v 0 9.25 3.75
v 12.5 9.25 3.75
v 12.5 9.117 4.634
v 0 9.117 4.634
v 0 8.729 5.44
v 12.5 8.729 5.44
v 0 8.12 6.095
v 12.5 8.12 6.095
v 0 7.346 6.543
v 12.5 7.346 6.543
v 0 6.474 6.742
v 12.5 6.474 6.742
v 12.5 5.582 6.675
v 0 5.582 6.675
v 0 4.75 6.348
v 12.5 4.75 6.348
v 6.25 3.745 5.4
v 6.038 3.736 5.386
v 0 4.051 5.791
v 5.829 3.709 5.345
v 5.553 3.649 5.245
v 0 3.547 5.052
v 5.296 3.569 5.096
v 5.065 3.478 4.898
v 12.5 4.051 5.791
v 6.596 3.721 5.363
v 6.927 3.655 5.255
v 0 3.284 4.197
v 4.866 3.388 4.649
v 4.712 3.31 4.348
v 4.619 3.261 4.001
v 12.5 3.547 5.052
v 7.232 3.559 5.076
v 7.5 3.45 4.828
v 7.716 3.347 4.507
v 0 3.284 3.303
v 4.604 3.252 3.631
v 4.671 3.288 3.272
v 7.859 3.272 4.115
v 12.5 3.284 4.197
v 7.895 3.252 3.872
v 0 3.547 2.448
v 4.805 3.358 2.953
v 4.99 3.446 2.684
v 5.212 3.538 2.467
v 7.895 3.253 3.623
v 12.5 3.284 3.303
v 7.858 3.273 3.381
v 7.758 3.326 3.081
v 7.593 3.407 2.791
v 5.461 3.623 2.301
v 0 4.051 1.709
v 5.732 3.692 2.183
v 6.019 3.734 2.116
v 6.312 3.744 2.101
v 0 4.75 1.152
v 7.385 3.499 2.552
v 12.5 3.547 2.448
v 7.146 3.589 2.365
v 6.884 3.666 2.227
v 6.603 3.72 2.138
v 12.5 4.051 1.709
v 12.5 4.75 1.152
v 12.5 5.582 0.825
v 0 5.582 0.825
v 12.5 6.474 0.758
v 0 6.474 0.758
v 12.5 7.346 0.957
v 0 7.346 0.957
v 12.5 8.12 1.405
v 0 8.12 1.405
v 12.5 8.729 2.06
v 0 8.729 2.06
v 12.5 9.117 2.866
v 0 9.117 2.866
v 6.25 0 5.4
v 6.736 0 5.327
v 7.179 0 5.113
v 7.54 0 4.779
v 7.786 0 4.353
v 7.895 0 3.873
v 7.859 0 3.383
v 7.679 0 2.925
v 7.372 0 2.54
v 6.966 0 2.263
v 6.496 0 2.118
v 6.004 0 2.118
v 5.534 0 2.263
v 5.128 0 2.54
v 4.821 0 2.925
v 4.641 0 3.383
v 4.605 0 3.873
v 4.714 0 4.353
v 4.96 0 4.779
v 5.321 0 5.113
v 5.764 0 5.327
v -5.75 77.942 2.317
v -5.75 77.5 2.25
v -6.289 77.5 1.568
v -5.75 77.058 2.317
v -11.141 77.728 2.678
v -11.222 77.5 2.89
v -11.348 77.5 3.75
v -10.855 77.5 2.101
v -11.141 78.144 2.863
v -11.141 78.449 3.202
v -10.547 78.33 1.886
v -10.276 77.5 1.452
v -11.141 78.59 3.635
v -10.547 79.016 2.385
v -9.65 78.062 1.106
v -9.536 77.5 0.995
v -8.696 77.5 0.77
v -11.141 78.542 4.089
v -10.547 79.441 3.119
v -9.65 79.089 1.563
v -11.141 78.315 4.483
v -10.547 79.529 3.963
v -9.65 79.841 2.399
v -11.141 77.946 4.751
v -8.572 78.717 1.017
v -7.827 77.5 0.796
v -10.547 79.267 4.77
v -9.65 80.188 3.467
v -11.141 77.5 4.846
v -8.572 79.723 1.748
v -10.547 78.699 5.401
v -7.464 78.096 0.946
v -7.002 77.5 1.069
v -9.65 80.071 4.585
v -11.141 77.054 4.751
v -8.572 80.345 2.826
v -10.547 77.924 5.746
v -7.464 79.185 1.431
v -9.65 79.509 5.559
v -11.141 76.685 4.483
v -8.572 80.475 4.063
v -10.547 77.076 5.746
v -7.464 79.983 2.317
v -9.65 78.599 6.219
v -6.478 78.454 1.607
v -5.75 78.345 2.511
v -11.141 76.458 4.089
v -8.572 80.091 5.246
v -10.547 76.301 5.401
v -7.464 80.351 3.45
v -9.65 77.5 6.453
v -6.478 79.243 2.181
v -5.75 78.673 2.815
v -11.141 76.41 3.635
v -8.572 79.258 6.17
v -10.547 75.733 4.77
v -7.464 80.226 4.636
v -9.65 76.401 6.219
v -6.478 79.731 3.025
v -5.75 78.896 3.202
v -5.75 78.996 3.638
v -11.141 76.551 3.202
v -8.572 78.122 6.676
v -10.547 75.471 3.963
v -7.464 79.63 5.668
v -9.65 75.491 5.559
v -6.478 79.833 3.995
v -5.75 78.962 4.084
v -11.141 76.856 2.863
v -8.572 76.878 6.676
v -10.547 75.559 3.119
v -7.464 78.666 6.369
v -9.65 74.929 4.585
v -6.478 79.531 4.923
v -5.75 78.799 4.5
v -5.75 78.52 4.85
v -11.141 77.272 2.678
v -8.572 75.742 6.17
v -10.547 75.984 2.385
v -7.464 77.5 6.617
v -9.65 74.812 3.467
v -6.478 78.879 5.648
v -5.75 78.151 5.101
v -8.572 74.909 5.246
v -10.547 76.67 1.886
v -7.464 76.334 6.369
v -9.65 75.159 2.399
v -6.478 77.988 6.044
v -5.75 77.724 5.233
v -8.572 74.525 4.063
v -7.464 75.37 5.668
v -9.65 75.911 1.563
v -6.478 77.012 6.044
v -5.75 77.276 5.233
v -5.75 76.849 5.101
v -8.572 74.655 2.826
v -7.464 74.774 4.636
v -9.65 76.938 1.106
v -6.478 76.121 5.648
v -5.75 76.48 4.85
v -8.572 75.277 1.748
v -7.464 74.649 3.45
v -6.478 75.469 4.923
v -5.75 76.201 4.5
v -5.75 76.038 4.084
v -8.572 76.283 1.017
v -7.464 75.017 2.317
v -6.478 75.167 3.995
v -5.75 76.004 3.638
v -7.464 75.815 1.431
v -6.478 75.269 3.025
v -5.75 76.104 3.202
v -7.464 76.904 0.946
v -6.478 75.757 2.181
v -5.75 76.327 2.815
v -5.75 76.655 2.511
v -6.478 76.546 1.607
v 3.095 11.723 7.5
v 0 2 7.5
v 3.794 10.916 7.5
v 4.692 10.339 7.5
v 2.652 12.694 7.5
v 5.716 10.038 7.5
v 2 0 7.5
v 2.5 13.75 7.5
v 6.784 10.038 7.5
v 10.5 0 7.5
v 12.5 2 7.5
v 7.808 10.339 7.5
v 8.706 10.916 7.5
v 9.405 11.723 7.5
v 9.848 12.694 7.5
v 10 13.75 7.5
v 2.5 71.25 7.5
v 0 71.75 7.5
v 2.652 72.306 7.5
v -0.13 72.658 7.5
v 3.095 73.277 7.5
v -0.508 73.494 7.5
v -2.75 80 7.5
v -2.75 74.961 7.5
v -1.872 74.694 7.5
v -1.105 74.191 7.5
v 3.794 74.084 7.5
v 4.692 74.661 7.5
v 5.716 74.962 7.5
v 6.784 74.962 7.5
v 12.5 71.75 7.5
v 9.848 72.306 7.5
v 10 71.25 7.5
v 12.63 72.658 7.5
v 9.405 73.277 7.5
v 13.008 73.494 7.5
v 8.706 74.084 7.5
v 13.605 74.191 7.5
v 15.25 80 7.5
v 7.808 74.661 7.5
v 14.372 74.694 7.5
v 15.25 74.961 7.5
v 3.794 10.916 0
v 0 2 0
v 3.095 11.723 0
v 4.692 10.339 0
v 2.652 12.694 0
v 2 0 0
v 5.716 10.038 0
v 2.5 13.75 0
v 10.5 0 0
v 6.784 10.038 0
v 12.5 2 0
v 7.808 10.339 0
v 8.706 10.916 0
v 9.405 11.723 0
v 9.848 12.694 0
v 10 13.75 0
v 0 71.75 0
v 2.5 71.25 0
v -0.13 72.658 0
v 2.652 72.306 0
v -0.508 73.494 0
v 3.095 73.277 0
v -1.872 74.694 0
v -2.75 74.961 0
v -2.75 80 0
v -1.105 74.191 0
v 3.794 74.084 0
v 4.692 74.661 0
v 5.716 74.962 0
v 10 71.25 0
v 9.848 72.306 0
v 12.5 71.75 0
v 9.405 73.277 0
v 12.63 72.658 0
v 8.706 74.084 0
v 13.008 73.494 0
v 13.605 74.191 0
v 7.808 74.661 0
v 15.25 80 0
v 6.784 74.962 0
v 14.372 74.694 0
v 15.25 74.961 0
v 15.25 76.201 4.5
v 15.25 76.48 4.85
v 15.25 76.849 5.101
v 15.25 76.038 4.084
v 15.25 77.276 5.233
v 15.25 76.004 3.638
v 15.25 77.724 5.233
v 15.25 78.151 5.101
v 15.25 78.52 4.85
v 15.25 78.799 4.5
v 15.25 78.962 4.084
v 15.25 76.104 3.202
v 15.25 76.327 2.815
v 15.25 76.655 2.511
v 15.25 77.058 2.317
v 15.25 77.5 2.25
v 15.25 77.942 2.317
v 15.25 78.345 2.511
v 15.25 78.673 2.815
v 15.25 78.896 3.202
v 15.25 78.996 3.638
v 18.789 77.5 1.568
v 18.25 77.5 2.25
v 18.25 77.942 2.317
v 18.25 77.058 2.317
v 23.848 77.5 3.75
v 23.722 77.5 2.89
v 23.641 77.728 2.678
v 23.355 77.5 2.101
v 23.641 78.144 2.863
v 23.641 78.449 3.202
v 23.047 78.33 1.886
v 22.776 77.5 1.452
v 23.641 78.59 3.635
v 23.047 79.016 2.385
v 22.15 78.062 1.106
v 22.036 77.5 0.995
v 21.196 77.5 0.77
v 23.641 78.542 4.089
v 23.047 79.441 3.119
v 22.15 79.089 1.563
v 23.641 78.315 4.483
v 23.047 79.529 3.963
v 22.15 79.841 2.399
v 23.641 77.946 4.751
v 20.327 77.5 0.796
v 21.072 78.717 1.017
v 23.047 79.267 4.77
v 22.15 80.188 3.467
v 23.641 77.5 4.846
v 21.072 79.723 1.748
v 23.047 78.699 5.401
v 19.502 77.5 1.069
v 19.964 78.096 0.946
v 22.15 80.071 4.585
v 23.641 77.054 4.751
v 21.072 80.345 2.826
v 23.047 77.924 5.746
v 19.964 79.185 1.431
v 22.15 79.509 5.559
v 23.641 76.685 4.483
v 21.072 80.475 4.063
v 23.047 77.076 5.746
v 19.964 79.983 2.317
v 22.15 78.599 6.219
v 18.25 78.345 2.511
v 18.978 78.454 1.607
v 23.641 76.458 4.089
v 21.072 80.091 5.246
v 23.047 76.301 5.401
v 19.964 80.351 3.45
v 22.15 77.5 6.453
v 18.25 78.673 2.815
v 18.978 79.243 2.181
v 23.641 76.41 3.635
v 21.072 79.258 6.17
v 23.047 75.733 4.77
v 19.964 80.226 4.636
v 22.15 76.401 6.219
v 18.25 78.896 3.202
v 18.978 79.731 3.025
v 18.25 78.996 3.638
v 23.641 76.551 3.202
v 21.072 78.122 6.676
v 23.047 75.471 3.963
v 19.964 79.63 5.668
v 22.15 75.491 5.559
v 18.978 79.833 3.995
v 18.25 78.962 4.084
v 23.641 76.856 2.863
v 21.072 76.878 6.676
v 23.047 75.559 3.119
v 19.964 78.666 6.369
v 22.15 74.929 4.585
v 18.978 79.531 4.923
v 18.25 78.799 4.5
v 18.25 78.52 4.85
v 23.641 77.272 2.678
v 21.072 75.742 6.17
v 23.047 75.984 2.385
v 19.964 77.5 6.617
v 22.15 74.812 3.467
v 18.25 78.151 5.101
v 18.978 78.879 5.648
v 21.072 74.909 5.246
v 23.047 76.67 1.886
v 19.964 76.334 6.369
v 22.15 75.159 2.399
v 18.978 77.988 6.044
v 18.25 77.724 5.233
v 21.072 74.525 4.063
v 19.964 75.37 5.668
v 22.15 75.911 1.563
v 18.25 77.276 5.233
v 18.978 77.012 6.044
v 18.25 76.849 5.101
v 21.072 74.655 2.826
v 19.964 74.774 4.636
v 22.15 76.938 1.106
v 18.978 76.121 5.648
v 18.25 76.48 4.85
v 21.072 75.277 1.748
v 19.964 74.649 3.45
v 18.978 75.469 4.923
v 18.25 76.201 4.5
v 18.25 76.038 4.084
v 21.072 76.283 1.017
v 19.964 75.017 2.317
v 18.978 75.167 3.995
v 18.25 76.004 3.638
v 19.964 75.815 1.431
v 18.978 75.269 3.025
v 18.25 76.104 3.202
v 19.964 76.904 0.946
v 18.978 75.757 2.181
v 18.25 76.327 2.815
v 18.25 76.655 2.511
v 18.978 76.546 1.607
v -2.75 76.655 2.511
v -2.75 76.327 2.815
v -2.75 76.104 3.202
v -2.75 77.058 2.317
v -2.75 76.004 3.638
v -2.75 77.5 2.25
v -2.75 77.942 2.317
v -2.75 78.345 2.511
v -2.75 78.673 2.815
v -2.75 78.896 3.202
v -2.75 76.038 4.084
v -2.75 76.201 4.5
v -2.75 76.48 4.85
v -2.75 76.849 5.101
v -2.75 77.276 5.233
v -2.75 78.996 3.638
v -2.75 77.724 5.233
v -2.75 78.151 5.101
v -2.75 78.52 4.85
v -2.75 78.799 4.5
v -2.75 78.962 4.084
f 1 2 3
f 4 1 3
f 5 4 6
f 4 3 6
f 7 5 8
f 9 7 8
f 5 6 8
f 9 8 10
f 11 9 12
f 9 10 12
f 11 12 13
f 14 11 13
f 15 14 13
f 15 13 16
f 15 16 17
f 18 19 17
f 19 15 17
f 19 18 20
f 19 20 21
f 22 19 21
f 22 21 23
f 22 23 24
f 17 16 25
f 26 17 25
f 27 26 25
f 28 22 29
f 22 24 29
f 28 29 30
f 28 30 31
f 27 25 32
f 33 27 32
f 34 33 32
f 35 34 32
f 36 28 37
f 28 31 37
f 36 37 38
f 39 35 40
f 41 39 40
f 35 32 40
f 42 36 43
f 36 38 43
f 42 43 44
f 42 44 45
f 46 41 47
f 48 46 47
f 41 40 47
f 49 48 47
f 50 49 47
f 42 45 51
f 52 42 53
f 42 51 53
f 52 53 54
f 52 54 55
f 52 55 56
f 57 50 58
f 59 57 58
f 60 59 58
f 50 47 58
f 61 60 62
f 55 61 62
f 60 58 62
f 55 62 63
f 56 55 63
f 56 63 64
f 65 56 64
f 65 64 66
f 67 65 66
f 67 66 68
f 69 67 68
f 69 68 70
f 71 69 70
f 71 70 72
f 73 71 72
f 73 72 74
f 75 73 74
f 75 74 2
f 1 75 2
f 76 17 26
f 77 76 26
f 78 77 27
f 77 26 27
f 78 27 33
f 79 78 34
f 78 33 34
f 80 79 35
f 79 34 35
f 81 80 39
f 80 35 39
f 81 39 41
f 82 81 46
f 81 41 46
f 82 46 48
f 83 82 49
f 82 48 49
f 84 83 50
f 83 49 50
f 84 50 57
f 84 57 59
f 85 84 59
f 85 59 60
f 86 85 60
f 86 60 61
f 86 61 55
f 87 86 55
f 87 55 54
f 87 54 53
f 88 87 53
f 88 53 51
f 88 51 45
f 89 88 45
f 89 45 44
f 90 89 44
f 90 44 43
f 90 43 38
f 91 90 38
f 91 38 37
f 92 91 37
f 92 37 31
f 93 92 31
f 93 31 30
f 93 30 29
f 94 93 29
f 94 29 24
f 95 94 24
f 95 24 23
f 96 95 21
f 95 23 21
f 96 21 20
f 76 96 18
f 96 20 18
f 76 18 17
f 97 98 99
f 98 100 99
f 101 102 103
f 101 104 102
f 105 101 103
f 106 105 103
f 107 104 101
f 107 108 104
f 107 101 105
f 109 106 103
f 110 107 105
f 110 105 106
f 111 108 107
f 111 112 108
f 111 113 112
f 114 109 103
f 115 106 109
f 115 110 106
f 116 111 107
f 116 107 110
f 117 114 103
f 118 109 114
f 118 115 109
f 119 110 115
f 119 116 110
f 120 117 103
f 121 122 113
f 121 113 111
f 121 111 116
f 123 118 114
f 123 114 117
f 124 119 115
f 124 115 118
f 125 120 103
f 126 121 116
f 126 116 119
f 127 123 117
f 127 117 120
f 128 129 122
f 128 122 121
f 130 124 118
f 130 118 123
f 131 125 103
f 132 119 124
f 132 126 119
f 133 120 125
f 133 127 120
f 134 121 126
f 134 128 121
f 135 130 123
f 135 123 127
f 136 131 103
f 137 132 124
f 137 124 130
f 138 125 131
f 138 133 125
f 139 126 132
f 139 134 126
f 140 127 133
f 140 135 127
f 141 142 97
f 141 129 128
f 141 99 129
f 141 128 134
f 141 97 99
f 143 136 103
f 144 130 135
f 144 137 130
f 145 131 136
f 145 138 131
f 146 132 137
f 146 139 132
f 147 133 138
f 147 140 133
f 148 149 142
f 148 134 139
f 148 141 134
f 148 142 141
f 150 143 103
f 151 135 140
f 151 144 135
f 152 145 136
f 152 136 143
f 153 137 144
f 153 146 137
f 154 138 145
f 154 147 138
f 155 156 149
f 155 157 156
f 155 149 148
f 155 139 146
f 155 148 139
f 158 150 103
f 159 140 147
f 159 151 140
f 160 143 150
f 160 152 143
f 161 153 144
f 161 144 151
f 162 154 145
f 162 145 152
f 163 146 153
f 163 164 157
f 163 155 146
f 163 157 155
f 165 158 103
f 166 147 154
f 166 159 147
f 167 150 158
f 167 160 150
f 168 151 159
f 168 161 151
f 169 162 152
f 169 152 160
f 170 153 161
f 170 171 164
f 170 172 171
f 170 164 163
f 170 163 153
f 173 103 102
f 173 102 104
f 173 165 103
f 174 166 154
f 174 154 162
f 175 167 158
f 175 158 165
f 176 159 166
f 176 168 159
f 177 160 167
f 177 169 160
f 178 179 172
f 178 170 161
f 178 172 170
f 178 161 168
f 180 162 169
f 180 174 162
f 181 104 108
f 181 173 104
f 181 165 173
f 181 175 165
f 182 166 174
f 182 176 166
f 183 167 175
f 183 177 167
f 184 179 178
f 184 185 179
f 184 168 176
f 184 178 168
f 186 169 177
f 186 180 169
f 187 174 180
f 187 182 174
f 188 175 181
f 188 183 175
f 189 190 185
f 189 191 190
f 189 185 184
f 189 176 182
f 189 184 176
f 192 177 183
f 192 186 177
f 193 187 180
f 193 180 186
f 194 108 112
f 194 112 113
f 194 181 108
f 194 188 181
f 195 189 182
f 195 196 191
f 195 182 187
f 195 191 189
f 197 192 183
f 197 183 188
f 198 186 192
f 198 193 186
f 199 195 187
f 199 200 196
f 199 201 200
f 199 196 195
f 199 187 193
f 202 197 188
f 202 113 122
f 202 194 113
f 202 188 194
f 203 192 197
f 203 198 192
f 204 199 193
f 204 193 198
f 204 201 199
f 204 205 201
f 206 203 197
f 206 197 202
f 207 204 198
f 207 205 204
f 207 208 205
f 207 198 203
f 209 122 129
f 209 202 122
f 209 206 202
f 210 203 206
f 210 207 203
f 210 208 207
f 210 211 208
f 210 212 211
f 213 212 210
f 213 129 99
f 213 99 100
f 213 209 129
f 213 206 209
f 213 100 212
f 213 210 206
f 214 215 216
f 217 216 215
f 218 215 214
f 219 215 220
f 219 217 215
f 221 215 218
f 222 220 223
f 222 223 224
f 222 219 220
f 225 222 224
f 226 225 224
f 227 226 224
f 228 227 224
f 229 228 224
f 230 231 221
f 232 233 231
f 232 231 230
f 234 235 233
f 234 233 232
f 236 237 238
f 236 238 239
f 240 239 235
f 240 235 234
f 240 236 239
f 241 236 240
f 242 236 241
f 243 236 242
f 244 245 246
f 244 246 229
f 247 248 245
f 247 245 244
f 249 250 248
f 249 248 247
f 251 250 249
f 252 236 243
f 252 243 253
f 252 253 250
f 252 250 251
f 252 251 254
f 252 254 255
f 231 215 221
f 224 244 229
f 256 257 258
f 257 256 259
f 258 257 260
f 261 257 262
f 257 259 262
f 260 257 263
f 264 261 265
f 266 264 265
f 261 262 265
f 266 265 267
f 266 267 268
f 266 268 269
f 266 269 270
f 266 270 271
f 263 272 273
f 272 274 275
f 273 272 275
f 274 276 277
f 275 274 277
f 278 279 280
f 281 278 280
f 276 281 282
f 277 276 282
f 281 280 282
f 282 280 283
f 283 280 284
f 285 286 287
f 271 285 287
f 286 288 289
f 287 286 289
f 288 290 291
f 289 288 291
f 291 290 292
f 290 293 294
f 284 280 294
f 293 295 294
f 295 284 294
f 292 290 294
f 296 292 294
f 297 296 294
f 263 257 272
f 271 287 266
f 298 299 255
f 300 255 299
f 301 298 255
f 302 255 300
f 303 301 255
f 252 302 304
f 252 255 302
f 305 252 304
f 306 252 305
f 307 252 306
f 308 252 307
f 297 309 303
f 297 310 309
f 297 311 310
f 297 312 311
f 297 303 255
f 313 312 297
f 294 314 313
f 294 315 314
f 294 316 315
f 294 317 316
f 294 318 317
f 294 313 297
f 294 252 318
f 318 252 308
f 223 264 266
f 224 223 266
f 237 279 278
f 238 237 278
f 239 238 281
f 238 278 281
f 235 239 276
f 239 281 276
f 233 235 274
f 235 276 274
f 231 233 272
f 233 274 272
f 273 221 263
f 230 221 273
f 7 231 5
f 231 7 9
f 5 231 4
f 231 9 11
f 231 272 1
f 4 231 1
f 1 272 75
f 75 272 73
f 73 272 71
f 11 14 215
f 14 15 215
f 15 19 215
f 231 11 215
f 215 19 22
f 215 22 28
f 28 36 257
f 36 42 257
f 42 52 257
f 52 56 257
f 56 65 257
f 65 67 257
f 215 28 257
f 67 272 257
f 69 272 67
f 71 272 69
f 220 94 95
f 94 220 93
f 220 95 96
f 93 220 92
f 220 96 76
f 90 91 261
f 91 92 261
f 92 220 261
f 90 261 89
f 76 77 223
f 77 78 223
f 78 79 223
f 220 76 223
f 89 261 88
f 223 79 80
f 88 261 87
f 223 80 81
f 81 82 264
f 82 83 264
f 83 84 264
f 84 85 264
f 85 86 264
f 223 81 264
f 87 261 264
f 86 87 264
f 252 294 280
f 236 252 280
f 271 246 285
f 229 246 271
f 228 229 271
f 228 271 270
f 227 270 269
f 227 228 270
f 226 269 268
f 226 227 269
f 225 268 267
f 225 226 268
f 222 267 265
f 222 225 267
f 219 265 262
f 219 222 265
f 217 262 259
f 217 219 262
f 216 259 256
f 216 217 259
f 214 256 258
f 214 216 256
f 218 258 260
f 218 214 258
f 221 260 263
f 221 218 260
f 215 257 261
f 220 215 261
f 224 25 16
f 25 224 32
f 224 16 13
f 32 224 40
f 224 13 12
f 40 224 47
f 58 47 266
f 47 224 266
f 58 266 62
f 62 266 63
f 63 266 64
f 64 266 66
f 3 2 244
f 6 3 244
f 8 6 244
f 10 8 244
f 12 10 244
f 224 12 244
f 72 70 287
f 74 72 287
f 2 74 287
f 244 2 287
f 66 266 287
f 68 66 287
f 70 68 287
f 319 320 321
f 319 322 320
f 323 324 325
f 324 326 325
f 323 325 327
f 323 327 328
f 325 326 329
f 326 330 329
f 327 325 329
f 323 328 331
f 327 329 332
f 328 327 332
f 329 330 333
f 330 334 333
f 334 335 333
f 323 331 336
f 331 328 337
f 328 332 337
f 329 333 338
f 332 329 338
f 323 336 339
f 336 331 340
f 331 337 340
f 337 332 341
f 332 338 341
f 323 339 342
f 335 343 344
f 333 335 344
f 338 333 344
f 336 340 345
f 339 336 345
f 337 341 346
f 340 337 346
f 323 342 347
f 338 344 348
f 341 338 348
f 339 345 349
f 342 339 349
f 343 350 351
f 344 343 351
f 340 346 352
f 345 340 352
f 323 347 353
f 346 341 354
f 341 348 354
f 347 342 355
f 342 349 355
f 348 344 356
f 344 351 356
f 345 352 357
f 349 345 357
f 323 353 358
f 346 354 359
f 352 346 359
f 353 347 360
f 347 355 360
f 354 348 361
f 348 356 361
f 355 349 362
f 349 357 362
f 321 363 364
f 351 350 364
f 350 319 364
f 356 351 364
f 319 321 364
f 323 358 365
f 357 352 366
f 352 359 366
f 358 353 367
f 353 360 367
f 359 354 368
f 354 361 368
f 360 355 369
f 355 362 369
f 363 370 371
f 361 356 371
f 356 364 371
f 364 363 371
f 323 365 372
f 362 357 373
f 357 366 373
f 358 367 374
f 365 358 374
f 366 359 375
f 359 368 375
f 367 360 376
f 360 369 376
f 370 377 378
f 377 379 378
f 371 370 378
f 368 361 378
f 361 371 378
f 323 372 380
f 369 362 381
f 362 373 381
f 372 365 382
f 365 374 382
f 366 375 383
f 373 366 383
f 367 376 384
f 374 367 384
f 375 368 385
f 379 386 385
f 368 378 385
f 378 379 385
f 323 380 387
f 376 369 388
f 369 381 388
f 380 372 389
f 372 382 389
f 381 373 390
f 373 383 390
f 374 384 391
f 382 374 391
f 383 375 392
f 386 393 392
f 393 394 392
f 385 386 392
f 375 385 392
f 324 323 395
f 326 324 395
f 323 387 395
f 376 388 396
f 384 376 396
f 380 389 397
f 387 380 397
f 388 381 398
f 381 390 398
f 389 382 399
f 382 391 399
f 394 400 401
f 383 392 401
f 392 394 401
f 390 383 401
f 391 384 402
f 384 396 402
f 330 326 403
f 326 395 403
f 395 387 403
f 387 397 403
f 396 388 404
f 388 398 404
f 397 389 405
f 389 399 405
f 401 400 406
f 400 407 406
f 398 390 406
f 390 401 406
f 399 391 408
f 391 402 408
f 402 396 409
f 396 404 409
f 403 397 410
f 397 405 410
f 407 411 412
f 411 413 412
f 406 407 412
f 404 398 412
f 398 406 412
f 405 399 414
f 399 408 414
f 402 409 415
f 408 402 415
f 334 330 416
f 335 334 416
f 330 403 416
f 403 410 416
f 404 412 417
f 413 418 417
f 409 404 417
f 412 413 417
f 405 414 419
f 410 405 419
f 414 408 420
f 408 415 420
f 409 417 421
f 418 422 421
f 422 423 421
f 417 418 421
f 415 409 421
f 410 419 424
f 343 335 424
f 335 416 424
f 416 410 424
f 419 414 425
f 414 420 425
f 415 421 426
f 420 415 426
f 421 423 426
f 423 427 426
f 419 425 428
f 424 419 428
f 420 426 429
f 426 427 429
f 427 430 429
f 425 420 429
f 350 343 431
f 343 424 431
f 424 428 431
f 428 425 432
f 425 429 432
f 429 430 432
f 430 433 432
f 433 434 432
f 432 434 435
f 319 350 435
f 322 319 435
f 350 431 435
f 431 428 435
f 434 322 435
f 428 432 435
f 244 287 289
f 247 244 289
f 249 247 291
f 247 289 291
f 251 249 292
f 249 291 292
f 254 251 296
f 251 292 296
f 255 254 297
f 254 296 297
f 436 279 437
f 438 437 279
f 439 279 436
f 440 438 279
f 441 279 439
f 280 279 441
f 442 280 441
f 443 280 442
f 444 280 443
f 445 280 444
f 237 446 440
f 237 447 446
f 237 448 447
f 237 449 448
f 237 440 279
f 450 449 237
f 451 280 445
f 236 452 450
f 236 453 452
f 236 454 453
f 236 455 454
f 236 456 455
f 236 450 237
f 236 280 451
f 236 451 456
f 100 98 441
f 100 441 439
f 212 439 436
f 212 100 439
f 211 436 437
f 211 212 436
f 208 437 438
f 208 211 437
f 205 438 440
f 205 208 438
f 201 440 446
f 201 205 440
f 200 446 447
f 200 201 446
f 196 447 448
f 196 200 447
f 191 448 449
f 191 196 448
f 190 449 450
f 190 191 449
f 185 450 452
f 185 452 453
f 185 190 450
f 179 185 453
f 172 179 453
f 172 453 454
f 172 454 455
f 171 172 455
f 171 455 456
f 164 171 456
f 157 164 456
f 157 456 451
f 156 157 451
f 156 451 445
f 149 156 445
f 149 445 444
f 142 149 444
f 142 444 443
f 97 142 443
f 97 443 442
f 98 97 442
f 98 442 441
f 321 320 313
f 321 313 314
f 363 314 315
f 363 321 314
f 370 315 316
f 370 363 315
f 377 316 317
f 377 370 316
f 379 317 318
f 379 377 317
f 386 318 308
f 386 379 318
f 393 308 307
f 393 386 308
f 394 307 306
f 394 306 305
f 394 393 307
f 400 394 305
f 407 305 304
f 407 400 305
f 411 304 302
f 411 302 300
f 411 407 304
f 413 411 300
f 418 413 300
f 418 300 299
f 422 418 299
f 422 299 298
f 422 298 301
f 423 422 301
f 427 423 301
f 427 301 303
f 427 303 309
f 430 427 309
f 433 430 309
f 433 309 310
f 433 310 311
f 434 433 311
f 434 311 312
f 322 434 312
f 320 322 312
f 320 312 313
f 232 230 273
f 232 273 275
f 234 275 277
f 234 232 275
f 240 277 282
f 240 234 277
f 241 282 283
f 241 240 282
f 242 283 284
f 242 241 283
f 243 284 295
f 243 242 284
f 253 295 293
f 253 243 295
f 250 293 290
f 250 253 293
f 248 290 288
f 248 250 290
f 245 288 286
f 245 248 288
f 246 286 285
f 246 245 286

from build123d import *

# Parameters (mm, degrees)
AUFSATZ_LINEAR_AUSTRAGEN1_DEPTH = 7.5
SCHNITT_LINEAR_AUSTRAGEN1_DEPTH = 10
SKIZZE7_R                       = 3
SCHNITT_LINEAR_AUSTRAGEN4_DEPTH = 84.113251049
M4_GEWINDEBOHRUNG1_D            = 3.3
M4_GEWINDEBOHRUNG1_DEPTH        = 7.5
M4_GEWINDEBOHRUNG1_TIP          = 0.991420021
SKIZZE9_OUTSIDE_W               = 26.654
SKIZZE9_OUTSIDE_H               = 99.154
SKIZZE9_OUTSIDE_R               = 1.5
SCHNITT_LINEAR_AUSTRAGEN5_DEPTH = 6
SKIZZE10_OUTSIDE_W              = 26.654
SKIZZE10_OUTSIDE_H              = 99.154
SKIZZE10_OUTSIDE_R              = 1.5
SCHNITT_LINEAR_AUSTRAGEN6_DEPTH = 6


with BuildPart() as part:
    # Skizze1 → Aufsatz-Linear austragen1 (new body)
    with BuildSketch(Plane.XY):
        with BuildLine():
            Line((-8.75, 75), (-3.25, 75))
            ThreePointArc((-3.25, 75), (-0.951902961, 74.048097039), (0, 71.75))
            Line((0, 71.75), (0, 2))
            Line((0, 2), (2, 0))
            Line((2, 0), (10.5, 0))
            Line((10.5, 0), (12.5, 2))
            Line((12.5, 2), (12.5, 71.75))
            ThreePointArc((12.5, 71.75), (13.451902961, 74.048097039), (15.75, 75))
            Line((15.75, 75), (21.25, 75))
            Line((21.25, 75), (21.25, 80))
            Line((21.25, 80), (-8.75, 80))
            Line((-8.75, 80), (-8.75, 75))
        make_face()
    extrude(amount=AUFSATZ_LINEAR_AUSTRAGEN1_DEPTH)

    # Skizze2 → Schnitt-Linear austragen1 (cut)
    with BuildSketch(Plane.XY.offset(7.5)):
        with BuildLine():
            Line((10, 71.25), (10, 13.75))
            ThreePointArc((10, 13.75), (6.25, 10), (2.5, 13.75))
            Line((2.5, 13.75), (2.5, 71.25))
            ThreePointArc((2.5, 71.25), (6.25, 75), (10, 71.25))
        make_face()
    extrude(amount=-SCHNITT_LINEAR_AUSTRAGEN1_DEPTH, mode=Mode.SUBTRACT)

    # Skizze7 → Schnitt-Linear austragen4 (cut, through all)
    with BuildSketch(Plane(origin=(12.5, 0, 0), x_dir=(0, 0, -1), z_dir=(1, 0, 0))):
        with Locations(Location((-3.75, 6.25, 0), (0, 0, 90))):
            Circle(SKIZZE7_R)
    extrude(amount=-SCHNITT_LINEAR_AUSTRAGEN4_DEPTH, mode=Mode.SUBTRACT)

    # M4 Gewindebohrung1
    with Locations(Plane(origin=(6.25, 0, 3.75), x_dir=(0, 0, -1), z_dir=(0, -1, 0))):
        with Locations((0, 0)):
            Hole(M4_GEWINDEBOHRUNG1_D / 2, depth=M4_GEWINDEBOHRUNG1_DEPTH)
            with Locations((0, 0, -(M4_GEWINDEBOHRUNG1_DEPTH + M4_GEWINDEBOHRUNG1_TIP / 2))):  # 118° drill point
                Cone(0, M4_GEWINDEBOHRUNG1_D / 2, M4_GEWINDEBOHRUNG1_TIP, mode=Mode.SUBTRACT)

    # Skizze9 outside → Schnitt-Linear austragen5 (cut)
    with BuildSketch(Plane(origin=(21.25, 0, 0), x_dir=(0, 0, -1), z_dir=(1, 0, 0))):
        with Locations((-3.75, 40)):
            Rectangle(SKIZZE9_OUTSIDE_W, SKIZZE9_OUTSIDE_H)
        with Locations((-3.75, 77.5)):
            Circle(SKIZZE9_OUTSIDE_R, mode=Mode.SUBTRACT)
    extrude(amount=-SCHNITT_LINEAR_AUSTRAGEN5_DEPTH, mode=Mode.SUBTRACT)

    # Skizze10 outside → Schnitt-Linear austragen6 (cut)
    with BuildSketch(Plane.ZY.offset(8.75)):
        with Locations((3.75, 40)):
            Rectangle(SKIZZE10_OUTSIDE_W, SKIZZE10_OUTSIDE_H)
        with Locations(Location((3.75, 77.5, 0), (0, 0, 180))):
            Circle(SKIZZE10_OUTSIDE_R, mode=Mode.SUBTRACT)
    extrude(amount=-SCHNITT_LINEAR_AUSTRAGEN6_DEPTH, mode=Mode.SUBTRACT)

    # Skizze11 → Rotation2 (revolve)
    with BuildSketch(Plane(origin=(0, 77.5, 0), x_dir=(1, 0, 0), z_dir=(0, 1, 0))):
        with BuildLine():
            Line((18.25, -2.25), (18.25, -3.75))
            Line((18.25, -3.75), (23.848076211, -3.75))
            ThreePointArc((23.848076211, -3.75), (21.624533347, -0.852222521), (18.25, -2.25))
        make_face()
        with BuildLine():
            Line((-5.75, -2.25), (-5.75, -3.75))
            Line((-5.75, -3.75), (-11.348076211, -3.75))
            ThreePointArc((-11.348076211, -3.75), (-9.124533347, -0.852222521), (-5.75, -2.25))
        make_face()
    revolve(axis=Axis((-8.75, 77.5, 3.75), (1, 0, 0)))


solid = part.part
